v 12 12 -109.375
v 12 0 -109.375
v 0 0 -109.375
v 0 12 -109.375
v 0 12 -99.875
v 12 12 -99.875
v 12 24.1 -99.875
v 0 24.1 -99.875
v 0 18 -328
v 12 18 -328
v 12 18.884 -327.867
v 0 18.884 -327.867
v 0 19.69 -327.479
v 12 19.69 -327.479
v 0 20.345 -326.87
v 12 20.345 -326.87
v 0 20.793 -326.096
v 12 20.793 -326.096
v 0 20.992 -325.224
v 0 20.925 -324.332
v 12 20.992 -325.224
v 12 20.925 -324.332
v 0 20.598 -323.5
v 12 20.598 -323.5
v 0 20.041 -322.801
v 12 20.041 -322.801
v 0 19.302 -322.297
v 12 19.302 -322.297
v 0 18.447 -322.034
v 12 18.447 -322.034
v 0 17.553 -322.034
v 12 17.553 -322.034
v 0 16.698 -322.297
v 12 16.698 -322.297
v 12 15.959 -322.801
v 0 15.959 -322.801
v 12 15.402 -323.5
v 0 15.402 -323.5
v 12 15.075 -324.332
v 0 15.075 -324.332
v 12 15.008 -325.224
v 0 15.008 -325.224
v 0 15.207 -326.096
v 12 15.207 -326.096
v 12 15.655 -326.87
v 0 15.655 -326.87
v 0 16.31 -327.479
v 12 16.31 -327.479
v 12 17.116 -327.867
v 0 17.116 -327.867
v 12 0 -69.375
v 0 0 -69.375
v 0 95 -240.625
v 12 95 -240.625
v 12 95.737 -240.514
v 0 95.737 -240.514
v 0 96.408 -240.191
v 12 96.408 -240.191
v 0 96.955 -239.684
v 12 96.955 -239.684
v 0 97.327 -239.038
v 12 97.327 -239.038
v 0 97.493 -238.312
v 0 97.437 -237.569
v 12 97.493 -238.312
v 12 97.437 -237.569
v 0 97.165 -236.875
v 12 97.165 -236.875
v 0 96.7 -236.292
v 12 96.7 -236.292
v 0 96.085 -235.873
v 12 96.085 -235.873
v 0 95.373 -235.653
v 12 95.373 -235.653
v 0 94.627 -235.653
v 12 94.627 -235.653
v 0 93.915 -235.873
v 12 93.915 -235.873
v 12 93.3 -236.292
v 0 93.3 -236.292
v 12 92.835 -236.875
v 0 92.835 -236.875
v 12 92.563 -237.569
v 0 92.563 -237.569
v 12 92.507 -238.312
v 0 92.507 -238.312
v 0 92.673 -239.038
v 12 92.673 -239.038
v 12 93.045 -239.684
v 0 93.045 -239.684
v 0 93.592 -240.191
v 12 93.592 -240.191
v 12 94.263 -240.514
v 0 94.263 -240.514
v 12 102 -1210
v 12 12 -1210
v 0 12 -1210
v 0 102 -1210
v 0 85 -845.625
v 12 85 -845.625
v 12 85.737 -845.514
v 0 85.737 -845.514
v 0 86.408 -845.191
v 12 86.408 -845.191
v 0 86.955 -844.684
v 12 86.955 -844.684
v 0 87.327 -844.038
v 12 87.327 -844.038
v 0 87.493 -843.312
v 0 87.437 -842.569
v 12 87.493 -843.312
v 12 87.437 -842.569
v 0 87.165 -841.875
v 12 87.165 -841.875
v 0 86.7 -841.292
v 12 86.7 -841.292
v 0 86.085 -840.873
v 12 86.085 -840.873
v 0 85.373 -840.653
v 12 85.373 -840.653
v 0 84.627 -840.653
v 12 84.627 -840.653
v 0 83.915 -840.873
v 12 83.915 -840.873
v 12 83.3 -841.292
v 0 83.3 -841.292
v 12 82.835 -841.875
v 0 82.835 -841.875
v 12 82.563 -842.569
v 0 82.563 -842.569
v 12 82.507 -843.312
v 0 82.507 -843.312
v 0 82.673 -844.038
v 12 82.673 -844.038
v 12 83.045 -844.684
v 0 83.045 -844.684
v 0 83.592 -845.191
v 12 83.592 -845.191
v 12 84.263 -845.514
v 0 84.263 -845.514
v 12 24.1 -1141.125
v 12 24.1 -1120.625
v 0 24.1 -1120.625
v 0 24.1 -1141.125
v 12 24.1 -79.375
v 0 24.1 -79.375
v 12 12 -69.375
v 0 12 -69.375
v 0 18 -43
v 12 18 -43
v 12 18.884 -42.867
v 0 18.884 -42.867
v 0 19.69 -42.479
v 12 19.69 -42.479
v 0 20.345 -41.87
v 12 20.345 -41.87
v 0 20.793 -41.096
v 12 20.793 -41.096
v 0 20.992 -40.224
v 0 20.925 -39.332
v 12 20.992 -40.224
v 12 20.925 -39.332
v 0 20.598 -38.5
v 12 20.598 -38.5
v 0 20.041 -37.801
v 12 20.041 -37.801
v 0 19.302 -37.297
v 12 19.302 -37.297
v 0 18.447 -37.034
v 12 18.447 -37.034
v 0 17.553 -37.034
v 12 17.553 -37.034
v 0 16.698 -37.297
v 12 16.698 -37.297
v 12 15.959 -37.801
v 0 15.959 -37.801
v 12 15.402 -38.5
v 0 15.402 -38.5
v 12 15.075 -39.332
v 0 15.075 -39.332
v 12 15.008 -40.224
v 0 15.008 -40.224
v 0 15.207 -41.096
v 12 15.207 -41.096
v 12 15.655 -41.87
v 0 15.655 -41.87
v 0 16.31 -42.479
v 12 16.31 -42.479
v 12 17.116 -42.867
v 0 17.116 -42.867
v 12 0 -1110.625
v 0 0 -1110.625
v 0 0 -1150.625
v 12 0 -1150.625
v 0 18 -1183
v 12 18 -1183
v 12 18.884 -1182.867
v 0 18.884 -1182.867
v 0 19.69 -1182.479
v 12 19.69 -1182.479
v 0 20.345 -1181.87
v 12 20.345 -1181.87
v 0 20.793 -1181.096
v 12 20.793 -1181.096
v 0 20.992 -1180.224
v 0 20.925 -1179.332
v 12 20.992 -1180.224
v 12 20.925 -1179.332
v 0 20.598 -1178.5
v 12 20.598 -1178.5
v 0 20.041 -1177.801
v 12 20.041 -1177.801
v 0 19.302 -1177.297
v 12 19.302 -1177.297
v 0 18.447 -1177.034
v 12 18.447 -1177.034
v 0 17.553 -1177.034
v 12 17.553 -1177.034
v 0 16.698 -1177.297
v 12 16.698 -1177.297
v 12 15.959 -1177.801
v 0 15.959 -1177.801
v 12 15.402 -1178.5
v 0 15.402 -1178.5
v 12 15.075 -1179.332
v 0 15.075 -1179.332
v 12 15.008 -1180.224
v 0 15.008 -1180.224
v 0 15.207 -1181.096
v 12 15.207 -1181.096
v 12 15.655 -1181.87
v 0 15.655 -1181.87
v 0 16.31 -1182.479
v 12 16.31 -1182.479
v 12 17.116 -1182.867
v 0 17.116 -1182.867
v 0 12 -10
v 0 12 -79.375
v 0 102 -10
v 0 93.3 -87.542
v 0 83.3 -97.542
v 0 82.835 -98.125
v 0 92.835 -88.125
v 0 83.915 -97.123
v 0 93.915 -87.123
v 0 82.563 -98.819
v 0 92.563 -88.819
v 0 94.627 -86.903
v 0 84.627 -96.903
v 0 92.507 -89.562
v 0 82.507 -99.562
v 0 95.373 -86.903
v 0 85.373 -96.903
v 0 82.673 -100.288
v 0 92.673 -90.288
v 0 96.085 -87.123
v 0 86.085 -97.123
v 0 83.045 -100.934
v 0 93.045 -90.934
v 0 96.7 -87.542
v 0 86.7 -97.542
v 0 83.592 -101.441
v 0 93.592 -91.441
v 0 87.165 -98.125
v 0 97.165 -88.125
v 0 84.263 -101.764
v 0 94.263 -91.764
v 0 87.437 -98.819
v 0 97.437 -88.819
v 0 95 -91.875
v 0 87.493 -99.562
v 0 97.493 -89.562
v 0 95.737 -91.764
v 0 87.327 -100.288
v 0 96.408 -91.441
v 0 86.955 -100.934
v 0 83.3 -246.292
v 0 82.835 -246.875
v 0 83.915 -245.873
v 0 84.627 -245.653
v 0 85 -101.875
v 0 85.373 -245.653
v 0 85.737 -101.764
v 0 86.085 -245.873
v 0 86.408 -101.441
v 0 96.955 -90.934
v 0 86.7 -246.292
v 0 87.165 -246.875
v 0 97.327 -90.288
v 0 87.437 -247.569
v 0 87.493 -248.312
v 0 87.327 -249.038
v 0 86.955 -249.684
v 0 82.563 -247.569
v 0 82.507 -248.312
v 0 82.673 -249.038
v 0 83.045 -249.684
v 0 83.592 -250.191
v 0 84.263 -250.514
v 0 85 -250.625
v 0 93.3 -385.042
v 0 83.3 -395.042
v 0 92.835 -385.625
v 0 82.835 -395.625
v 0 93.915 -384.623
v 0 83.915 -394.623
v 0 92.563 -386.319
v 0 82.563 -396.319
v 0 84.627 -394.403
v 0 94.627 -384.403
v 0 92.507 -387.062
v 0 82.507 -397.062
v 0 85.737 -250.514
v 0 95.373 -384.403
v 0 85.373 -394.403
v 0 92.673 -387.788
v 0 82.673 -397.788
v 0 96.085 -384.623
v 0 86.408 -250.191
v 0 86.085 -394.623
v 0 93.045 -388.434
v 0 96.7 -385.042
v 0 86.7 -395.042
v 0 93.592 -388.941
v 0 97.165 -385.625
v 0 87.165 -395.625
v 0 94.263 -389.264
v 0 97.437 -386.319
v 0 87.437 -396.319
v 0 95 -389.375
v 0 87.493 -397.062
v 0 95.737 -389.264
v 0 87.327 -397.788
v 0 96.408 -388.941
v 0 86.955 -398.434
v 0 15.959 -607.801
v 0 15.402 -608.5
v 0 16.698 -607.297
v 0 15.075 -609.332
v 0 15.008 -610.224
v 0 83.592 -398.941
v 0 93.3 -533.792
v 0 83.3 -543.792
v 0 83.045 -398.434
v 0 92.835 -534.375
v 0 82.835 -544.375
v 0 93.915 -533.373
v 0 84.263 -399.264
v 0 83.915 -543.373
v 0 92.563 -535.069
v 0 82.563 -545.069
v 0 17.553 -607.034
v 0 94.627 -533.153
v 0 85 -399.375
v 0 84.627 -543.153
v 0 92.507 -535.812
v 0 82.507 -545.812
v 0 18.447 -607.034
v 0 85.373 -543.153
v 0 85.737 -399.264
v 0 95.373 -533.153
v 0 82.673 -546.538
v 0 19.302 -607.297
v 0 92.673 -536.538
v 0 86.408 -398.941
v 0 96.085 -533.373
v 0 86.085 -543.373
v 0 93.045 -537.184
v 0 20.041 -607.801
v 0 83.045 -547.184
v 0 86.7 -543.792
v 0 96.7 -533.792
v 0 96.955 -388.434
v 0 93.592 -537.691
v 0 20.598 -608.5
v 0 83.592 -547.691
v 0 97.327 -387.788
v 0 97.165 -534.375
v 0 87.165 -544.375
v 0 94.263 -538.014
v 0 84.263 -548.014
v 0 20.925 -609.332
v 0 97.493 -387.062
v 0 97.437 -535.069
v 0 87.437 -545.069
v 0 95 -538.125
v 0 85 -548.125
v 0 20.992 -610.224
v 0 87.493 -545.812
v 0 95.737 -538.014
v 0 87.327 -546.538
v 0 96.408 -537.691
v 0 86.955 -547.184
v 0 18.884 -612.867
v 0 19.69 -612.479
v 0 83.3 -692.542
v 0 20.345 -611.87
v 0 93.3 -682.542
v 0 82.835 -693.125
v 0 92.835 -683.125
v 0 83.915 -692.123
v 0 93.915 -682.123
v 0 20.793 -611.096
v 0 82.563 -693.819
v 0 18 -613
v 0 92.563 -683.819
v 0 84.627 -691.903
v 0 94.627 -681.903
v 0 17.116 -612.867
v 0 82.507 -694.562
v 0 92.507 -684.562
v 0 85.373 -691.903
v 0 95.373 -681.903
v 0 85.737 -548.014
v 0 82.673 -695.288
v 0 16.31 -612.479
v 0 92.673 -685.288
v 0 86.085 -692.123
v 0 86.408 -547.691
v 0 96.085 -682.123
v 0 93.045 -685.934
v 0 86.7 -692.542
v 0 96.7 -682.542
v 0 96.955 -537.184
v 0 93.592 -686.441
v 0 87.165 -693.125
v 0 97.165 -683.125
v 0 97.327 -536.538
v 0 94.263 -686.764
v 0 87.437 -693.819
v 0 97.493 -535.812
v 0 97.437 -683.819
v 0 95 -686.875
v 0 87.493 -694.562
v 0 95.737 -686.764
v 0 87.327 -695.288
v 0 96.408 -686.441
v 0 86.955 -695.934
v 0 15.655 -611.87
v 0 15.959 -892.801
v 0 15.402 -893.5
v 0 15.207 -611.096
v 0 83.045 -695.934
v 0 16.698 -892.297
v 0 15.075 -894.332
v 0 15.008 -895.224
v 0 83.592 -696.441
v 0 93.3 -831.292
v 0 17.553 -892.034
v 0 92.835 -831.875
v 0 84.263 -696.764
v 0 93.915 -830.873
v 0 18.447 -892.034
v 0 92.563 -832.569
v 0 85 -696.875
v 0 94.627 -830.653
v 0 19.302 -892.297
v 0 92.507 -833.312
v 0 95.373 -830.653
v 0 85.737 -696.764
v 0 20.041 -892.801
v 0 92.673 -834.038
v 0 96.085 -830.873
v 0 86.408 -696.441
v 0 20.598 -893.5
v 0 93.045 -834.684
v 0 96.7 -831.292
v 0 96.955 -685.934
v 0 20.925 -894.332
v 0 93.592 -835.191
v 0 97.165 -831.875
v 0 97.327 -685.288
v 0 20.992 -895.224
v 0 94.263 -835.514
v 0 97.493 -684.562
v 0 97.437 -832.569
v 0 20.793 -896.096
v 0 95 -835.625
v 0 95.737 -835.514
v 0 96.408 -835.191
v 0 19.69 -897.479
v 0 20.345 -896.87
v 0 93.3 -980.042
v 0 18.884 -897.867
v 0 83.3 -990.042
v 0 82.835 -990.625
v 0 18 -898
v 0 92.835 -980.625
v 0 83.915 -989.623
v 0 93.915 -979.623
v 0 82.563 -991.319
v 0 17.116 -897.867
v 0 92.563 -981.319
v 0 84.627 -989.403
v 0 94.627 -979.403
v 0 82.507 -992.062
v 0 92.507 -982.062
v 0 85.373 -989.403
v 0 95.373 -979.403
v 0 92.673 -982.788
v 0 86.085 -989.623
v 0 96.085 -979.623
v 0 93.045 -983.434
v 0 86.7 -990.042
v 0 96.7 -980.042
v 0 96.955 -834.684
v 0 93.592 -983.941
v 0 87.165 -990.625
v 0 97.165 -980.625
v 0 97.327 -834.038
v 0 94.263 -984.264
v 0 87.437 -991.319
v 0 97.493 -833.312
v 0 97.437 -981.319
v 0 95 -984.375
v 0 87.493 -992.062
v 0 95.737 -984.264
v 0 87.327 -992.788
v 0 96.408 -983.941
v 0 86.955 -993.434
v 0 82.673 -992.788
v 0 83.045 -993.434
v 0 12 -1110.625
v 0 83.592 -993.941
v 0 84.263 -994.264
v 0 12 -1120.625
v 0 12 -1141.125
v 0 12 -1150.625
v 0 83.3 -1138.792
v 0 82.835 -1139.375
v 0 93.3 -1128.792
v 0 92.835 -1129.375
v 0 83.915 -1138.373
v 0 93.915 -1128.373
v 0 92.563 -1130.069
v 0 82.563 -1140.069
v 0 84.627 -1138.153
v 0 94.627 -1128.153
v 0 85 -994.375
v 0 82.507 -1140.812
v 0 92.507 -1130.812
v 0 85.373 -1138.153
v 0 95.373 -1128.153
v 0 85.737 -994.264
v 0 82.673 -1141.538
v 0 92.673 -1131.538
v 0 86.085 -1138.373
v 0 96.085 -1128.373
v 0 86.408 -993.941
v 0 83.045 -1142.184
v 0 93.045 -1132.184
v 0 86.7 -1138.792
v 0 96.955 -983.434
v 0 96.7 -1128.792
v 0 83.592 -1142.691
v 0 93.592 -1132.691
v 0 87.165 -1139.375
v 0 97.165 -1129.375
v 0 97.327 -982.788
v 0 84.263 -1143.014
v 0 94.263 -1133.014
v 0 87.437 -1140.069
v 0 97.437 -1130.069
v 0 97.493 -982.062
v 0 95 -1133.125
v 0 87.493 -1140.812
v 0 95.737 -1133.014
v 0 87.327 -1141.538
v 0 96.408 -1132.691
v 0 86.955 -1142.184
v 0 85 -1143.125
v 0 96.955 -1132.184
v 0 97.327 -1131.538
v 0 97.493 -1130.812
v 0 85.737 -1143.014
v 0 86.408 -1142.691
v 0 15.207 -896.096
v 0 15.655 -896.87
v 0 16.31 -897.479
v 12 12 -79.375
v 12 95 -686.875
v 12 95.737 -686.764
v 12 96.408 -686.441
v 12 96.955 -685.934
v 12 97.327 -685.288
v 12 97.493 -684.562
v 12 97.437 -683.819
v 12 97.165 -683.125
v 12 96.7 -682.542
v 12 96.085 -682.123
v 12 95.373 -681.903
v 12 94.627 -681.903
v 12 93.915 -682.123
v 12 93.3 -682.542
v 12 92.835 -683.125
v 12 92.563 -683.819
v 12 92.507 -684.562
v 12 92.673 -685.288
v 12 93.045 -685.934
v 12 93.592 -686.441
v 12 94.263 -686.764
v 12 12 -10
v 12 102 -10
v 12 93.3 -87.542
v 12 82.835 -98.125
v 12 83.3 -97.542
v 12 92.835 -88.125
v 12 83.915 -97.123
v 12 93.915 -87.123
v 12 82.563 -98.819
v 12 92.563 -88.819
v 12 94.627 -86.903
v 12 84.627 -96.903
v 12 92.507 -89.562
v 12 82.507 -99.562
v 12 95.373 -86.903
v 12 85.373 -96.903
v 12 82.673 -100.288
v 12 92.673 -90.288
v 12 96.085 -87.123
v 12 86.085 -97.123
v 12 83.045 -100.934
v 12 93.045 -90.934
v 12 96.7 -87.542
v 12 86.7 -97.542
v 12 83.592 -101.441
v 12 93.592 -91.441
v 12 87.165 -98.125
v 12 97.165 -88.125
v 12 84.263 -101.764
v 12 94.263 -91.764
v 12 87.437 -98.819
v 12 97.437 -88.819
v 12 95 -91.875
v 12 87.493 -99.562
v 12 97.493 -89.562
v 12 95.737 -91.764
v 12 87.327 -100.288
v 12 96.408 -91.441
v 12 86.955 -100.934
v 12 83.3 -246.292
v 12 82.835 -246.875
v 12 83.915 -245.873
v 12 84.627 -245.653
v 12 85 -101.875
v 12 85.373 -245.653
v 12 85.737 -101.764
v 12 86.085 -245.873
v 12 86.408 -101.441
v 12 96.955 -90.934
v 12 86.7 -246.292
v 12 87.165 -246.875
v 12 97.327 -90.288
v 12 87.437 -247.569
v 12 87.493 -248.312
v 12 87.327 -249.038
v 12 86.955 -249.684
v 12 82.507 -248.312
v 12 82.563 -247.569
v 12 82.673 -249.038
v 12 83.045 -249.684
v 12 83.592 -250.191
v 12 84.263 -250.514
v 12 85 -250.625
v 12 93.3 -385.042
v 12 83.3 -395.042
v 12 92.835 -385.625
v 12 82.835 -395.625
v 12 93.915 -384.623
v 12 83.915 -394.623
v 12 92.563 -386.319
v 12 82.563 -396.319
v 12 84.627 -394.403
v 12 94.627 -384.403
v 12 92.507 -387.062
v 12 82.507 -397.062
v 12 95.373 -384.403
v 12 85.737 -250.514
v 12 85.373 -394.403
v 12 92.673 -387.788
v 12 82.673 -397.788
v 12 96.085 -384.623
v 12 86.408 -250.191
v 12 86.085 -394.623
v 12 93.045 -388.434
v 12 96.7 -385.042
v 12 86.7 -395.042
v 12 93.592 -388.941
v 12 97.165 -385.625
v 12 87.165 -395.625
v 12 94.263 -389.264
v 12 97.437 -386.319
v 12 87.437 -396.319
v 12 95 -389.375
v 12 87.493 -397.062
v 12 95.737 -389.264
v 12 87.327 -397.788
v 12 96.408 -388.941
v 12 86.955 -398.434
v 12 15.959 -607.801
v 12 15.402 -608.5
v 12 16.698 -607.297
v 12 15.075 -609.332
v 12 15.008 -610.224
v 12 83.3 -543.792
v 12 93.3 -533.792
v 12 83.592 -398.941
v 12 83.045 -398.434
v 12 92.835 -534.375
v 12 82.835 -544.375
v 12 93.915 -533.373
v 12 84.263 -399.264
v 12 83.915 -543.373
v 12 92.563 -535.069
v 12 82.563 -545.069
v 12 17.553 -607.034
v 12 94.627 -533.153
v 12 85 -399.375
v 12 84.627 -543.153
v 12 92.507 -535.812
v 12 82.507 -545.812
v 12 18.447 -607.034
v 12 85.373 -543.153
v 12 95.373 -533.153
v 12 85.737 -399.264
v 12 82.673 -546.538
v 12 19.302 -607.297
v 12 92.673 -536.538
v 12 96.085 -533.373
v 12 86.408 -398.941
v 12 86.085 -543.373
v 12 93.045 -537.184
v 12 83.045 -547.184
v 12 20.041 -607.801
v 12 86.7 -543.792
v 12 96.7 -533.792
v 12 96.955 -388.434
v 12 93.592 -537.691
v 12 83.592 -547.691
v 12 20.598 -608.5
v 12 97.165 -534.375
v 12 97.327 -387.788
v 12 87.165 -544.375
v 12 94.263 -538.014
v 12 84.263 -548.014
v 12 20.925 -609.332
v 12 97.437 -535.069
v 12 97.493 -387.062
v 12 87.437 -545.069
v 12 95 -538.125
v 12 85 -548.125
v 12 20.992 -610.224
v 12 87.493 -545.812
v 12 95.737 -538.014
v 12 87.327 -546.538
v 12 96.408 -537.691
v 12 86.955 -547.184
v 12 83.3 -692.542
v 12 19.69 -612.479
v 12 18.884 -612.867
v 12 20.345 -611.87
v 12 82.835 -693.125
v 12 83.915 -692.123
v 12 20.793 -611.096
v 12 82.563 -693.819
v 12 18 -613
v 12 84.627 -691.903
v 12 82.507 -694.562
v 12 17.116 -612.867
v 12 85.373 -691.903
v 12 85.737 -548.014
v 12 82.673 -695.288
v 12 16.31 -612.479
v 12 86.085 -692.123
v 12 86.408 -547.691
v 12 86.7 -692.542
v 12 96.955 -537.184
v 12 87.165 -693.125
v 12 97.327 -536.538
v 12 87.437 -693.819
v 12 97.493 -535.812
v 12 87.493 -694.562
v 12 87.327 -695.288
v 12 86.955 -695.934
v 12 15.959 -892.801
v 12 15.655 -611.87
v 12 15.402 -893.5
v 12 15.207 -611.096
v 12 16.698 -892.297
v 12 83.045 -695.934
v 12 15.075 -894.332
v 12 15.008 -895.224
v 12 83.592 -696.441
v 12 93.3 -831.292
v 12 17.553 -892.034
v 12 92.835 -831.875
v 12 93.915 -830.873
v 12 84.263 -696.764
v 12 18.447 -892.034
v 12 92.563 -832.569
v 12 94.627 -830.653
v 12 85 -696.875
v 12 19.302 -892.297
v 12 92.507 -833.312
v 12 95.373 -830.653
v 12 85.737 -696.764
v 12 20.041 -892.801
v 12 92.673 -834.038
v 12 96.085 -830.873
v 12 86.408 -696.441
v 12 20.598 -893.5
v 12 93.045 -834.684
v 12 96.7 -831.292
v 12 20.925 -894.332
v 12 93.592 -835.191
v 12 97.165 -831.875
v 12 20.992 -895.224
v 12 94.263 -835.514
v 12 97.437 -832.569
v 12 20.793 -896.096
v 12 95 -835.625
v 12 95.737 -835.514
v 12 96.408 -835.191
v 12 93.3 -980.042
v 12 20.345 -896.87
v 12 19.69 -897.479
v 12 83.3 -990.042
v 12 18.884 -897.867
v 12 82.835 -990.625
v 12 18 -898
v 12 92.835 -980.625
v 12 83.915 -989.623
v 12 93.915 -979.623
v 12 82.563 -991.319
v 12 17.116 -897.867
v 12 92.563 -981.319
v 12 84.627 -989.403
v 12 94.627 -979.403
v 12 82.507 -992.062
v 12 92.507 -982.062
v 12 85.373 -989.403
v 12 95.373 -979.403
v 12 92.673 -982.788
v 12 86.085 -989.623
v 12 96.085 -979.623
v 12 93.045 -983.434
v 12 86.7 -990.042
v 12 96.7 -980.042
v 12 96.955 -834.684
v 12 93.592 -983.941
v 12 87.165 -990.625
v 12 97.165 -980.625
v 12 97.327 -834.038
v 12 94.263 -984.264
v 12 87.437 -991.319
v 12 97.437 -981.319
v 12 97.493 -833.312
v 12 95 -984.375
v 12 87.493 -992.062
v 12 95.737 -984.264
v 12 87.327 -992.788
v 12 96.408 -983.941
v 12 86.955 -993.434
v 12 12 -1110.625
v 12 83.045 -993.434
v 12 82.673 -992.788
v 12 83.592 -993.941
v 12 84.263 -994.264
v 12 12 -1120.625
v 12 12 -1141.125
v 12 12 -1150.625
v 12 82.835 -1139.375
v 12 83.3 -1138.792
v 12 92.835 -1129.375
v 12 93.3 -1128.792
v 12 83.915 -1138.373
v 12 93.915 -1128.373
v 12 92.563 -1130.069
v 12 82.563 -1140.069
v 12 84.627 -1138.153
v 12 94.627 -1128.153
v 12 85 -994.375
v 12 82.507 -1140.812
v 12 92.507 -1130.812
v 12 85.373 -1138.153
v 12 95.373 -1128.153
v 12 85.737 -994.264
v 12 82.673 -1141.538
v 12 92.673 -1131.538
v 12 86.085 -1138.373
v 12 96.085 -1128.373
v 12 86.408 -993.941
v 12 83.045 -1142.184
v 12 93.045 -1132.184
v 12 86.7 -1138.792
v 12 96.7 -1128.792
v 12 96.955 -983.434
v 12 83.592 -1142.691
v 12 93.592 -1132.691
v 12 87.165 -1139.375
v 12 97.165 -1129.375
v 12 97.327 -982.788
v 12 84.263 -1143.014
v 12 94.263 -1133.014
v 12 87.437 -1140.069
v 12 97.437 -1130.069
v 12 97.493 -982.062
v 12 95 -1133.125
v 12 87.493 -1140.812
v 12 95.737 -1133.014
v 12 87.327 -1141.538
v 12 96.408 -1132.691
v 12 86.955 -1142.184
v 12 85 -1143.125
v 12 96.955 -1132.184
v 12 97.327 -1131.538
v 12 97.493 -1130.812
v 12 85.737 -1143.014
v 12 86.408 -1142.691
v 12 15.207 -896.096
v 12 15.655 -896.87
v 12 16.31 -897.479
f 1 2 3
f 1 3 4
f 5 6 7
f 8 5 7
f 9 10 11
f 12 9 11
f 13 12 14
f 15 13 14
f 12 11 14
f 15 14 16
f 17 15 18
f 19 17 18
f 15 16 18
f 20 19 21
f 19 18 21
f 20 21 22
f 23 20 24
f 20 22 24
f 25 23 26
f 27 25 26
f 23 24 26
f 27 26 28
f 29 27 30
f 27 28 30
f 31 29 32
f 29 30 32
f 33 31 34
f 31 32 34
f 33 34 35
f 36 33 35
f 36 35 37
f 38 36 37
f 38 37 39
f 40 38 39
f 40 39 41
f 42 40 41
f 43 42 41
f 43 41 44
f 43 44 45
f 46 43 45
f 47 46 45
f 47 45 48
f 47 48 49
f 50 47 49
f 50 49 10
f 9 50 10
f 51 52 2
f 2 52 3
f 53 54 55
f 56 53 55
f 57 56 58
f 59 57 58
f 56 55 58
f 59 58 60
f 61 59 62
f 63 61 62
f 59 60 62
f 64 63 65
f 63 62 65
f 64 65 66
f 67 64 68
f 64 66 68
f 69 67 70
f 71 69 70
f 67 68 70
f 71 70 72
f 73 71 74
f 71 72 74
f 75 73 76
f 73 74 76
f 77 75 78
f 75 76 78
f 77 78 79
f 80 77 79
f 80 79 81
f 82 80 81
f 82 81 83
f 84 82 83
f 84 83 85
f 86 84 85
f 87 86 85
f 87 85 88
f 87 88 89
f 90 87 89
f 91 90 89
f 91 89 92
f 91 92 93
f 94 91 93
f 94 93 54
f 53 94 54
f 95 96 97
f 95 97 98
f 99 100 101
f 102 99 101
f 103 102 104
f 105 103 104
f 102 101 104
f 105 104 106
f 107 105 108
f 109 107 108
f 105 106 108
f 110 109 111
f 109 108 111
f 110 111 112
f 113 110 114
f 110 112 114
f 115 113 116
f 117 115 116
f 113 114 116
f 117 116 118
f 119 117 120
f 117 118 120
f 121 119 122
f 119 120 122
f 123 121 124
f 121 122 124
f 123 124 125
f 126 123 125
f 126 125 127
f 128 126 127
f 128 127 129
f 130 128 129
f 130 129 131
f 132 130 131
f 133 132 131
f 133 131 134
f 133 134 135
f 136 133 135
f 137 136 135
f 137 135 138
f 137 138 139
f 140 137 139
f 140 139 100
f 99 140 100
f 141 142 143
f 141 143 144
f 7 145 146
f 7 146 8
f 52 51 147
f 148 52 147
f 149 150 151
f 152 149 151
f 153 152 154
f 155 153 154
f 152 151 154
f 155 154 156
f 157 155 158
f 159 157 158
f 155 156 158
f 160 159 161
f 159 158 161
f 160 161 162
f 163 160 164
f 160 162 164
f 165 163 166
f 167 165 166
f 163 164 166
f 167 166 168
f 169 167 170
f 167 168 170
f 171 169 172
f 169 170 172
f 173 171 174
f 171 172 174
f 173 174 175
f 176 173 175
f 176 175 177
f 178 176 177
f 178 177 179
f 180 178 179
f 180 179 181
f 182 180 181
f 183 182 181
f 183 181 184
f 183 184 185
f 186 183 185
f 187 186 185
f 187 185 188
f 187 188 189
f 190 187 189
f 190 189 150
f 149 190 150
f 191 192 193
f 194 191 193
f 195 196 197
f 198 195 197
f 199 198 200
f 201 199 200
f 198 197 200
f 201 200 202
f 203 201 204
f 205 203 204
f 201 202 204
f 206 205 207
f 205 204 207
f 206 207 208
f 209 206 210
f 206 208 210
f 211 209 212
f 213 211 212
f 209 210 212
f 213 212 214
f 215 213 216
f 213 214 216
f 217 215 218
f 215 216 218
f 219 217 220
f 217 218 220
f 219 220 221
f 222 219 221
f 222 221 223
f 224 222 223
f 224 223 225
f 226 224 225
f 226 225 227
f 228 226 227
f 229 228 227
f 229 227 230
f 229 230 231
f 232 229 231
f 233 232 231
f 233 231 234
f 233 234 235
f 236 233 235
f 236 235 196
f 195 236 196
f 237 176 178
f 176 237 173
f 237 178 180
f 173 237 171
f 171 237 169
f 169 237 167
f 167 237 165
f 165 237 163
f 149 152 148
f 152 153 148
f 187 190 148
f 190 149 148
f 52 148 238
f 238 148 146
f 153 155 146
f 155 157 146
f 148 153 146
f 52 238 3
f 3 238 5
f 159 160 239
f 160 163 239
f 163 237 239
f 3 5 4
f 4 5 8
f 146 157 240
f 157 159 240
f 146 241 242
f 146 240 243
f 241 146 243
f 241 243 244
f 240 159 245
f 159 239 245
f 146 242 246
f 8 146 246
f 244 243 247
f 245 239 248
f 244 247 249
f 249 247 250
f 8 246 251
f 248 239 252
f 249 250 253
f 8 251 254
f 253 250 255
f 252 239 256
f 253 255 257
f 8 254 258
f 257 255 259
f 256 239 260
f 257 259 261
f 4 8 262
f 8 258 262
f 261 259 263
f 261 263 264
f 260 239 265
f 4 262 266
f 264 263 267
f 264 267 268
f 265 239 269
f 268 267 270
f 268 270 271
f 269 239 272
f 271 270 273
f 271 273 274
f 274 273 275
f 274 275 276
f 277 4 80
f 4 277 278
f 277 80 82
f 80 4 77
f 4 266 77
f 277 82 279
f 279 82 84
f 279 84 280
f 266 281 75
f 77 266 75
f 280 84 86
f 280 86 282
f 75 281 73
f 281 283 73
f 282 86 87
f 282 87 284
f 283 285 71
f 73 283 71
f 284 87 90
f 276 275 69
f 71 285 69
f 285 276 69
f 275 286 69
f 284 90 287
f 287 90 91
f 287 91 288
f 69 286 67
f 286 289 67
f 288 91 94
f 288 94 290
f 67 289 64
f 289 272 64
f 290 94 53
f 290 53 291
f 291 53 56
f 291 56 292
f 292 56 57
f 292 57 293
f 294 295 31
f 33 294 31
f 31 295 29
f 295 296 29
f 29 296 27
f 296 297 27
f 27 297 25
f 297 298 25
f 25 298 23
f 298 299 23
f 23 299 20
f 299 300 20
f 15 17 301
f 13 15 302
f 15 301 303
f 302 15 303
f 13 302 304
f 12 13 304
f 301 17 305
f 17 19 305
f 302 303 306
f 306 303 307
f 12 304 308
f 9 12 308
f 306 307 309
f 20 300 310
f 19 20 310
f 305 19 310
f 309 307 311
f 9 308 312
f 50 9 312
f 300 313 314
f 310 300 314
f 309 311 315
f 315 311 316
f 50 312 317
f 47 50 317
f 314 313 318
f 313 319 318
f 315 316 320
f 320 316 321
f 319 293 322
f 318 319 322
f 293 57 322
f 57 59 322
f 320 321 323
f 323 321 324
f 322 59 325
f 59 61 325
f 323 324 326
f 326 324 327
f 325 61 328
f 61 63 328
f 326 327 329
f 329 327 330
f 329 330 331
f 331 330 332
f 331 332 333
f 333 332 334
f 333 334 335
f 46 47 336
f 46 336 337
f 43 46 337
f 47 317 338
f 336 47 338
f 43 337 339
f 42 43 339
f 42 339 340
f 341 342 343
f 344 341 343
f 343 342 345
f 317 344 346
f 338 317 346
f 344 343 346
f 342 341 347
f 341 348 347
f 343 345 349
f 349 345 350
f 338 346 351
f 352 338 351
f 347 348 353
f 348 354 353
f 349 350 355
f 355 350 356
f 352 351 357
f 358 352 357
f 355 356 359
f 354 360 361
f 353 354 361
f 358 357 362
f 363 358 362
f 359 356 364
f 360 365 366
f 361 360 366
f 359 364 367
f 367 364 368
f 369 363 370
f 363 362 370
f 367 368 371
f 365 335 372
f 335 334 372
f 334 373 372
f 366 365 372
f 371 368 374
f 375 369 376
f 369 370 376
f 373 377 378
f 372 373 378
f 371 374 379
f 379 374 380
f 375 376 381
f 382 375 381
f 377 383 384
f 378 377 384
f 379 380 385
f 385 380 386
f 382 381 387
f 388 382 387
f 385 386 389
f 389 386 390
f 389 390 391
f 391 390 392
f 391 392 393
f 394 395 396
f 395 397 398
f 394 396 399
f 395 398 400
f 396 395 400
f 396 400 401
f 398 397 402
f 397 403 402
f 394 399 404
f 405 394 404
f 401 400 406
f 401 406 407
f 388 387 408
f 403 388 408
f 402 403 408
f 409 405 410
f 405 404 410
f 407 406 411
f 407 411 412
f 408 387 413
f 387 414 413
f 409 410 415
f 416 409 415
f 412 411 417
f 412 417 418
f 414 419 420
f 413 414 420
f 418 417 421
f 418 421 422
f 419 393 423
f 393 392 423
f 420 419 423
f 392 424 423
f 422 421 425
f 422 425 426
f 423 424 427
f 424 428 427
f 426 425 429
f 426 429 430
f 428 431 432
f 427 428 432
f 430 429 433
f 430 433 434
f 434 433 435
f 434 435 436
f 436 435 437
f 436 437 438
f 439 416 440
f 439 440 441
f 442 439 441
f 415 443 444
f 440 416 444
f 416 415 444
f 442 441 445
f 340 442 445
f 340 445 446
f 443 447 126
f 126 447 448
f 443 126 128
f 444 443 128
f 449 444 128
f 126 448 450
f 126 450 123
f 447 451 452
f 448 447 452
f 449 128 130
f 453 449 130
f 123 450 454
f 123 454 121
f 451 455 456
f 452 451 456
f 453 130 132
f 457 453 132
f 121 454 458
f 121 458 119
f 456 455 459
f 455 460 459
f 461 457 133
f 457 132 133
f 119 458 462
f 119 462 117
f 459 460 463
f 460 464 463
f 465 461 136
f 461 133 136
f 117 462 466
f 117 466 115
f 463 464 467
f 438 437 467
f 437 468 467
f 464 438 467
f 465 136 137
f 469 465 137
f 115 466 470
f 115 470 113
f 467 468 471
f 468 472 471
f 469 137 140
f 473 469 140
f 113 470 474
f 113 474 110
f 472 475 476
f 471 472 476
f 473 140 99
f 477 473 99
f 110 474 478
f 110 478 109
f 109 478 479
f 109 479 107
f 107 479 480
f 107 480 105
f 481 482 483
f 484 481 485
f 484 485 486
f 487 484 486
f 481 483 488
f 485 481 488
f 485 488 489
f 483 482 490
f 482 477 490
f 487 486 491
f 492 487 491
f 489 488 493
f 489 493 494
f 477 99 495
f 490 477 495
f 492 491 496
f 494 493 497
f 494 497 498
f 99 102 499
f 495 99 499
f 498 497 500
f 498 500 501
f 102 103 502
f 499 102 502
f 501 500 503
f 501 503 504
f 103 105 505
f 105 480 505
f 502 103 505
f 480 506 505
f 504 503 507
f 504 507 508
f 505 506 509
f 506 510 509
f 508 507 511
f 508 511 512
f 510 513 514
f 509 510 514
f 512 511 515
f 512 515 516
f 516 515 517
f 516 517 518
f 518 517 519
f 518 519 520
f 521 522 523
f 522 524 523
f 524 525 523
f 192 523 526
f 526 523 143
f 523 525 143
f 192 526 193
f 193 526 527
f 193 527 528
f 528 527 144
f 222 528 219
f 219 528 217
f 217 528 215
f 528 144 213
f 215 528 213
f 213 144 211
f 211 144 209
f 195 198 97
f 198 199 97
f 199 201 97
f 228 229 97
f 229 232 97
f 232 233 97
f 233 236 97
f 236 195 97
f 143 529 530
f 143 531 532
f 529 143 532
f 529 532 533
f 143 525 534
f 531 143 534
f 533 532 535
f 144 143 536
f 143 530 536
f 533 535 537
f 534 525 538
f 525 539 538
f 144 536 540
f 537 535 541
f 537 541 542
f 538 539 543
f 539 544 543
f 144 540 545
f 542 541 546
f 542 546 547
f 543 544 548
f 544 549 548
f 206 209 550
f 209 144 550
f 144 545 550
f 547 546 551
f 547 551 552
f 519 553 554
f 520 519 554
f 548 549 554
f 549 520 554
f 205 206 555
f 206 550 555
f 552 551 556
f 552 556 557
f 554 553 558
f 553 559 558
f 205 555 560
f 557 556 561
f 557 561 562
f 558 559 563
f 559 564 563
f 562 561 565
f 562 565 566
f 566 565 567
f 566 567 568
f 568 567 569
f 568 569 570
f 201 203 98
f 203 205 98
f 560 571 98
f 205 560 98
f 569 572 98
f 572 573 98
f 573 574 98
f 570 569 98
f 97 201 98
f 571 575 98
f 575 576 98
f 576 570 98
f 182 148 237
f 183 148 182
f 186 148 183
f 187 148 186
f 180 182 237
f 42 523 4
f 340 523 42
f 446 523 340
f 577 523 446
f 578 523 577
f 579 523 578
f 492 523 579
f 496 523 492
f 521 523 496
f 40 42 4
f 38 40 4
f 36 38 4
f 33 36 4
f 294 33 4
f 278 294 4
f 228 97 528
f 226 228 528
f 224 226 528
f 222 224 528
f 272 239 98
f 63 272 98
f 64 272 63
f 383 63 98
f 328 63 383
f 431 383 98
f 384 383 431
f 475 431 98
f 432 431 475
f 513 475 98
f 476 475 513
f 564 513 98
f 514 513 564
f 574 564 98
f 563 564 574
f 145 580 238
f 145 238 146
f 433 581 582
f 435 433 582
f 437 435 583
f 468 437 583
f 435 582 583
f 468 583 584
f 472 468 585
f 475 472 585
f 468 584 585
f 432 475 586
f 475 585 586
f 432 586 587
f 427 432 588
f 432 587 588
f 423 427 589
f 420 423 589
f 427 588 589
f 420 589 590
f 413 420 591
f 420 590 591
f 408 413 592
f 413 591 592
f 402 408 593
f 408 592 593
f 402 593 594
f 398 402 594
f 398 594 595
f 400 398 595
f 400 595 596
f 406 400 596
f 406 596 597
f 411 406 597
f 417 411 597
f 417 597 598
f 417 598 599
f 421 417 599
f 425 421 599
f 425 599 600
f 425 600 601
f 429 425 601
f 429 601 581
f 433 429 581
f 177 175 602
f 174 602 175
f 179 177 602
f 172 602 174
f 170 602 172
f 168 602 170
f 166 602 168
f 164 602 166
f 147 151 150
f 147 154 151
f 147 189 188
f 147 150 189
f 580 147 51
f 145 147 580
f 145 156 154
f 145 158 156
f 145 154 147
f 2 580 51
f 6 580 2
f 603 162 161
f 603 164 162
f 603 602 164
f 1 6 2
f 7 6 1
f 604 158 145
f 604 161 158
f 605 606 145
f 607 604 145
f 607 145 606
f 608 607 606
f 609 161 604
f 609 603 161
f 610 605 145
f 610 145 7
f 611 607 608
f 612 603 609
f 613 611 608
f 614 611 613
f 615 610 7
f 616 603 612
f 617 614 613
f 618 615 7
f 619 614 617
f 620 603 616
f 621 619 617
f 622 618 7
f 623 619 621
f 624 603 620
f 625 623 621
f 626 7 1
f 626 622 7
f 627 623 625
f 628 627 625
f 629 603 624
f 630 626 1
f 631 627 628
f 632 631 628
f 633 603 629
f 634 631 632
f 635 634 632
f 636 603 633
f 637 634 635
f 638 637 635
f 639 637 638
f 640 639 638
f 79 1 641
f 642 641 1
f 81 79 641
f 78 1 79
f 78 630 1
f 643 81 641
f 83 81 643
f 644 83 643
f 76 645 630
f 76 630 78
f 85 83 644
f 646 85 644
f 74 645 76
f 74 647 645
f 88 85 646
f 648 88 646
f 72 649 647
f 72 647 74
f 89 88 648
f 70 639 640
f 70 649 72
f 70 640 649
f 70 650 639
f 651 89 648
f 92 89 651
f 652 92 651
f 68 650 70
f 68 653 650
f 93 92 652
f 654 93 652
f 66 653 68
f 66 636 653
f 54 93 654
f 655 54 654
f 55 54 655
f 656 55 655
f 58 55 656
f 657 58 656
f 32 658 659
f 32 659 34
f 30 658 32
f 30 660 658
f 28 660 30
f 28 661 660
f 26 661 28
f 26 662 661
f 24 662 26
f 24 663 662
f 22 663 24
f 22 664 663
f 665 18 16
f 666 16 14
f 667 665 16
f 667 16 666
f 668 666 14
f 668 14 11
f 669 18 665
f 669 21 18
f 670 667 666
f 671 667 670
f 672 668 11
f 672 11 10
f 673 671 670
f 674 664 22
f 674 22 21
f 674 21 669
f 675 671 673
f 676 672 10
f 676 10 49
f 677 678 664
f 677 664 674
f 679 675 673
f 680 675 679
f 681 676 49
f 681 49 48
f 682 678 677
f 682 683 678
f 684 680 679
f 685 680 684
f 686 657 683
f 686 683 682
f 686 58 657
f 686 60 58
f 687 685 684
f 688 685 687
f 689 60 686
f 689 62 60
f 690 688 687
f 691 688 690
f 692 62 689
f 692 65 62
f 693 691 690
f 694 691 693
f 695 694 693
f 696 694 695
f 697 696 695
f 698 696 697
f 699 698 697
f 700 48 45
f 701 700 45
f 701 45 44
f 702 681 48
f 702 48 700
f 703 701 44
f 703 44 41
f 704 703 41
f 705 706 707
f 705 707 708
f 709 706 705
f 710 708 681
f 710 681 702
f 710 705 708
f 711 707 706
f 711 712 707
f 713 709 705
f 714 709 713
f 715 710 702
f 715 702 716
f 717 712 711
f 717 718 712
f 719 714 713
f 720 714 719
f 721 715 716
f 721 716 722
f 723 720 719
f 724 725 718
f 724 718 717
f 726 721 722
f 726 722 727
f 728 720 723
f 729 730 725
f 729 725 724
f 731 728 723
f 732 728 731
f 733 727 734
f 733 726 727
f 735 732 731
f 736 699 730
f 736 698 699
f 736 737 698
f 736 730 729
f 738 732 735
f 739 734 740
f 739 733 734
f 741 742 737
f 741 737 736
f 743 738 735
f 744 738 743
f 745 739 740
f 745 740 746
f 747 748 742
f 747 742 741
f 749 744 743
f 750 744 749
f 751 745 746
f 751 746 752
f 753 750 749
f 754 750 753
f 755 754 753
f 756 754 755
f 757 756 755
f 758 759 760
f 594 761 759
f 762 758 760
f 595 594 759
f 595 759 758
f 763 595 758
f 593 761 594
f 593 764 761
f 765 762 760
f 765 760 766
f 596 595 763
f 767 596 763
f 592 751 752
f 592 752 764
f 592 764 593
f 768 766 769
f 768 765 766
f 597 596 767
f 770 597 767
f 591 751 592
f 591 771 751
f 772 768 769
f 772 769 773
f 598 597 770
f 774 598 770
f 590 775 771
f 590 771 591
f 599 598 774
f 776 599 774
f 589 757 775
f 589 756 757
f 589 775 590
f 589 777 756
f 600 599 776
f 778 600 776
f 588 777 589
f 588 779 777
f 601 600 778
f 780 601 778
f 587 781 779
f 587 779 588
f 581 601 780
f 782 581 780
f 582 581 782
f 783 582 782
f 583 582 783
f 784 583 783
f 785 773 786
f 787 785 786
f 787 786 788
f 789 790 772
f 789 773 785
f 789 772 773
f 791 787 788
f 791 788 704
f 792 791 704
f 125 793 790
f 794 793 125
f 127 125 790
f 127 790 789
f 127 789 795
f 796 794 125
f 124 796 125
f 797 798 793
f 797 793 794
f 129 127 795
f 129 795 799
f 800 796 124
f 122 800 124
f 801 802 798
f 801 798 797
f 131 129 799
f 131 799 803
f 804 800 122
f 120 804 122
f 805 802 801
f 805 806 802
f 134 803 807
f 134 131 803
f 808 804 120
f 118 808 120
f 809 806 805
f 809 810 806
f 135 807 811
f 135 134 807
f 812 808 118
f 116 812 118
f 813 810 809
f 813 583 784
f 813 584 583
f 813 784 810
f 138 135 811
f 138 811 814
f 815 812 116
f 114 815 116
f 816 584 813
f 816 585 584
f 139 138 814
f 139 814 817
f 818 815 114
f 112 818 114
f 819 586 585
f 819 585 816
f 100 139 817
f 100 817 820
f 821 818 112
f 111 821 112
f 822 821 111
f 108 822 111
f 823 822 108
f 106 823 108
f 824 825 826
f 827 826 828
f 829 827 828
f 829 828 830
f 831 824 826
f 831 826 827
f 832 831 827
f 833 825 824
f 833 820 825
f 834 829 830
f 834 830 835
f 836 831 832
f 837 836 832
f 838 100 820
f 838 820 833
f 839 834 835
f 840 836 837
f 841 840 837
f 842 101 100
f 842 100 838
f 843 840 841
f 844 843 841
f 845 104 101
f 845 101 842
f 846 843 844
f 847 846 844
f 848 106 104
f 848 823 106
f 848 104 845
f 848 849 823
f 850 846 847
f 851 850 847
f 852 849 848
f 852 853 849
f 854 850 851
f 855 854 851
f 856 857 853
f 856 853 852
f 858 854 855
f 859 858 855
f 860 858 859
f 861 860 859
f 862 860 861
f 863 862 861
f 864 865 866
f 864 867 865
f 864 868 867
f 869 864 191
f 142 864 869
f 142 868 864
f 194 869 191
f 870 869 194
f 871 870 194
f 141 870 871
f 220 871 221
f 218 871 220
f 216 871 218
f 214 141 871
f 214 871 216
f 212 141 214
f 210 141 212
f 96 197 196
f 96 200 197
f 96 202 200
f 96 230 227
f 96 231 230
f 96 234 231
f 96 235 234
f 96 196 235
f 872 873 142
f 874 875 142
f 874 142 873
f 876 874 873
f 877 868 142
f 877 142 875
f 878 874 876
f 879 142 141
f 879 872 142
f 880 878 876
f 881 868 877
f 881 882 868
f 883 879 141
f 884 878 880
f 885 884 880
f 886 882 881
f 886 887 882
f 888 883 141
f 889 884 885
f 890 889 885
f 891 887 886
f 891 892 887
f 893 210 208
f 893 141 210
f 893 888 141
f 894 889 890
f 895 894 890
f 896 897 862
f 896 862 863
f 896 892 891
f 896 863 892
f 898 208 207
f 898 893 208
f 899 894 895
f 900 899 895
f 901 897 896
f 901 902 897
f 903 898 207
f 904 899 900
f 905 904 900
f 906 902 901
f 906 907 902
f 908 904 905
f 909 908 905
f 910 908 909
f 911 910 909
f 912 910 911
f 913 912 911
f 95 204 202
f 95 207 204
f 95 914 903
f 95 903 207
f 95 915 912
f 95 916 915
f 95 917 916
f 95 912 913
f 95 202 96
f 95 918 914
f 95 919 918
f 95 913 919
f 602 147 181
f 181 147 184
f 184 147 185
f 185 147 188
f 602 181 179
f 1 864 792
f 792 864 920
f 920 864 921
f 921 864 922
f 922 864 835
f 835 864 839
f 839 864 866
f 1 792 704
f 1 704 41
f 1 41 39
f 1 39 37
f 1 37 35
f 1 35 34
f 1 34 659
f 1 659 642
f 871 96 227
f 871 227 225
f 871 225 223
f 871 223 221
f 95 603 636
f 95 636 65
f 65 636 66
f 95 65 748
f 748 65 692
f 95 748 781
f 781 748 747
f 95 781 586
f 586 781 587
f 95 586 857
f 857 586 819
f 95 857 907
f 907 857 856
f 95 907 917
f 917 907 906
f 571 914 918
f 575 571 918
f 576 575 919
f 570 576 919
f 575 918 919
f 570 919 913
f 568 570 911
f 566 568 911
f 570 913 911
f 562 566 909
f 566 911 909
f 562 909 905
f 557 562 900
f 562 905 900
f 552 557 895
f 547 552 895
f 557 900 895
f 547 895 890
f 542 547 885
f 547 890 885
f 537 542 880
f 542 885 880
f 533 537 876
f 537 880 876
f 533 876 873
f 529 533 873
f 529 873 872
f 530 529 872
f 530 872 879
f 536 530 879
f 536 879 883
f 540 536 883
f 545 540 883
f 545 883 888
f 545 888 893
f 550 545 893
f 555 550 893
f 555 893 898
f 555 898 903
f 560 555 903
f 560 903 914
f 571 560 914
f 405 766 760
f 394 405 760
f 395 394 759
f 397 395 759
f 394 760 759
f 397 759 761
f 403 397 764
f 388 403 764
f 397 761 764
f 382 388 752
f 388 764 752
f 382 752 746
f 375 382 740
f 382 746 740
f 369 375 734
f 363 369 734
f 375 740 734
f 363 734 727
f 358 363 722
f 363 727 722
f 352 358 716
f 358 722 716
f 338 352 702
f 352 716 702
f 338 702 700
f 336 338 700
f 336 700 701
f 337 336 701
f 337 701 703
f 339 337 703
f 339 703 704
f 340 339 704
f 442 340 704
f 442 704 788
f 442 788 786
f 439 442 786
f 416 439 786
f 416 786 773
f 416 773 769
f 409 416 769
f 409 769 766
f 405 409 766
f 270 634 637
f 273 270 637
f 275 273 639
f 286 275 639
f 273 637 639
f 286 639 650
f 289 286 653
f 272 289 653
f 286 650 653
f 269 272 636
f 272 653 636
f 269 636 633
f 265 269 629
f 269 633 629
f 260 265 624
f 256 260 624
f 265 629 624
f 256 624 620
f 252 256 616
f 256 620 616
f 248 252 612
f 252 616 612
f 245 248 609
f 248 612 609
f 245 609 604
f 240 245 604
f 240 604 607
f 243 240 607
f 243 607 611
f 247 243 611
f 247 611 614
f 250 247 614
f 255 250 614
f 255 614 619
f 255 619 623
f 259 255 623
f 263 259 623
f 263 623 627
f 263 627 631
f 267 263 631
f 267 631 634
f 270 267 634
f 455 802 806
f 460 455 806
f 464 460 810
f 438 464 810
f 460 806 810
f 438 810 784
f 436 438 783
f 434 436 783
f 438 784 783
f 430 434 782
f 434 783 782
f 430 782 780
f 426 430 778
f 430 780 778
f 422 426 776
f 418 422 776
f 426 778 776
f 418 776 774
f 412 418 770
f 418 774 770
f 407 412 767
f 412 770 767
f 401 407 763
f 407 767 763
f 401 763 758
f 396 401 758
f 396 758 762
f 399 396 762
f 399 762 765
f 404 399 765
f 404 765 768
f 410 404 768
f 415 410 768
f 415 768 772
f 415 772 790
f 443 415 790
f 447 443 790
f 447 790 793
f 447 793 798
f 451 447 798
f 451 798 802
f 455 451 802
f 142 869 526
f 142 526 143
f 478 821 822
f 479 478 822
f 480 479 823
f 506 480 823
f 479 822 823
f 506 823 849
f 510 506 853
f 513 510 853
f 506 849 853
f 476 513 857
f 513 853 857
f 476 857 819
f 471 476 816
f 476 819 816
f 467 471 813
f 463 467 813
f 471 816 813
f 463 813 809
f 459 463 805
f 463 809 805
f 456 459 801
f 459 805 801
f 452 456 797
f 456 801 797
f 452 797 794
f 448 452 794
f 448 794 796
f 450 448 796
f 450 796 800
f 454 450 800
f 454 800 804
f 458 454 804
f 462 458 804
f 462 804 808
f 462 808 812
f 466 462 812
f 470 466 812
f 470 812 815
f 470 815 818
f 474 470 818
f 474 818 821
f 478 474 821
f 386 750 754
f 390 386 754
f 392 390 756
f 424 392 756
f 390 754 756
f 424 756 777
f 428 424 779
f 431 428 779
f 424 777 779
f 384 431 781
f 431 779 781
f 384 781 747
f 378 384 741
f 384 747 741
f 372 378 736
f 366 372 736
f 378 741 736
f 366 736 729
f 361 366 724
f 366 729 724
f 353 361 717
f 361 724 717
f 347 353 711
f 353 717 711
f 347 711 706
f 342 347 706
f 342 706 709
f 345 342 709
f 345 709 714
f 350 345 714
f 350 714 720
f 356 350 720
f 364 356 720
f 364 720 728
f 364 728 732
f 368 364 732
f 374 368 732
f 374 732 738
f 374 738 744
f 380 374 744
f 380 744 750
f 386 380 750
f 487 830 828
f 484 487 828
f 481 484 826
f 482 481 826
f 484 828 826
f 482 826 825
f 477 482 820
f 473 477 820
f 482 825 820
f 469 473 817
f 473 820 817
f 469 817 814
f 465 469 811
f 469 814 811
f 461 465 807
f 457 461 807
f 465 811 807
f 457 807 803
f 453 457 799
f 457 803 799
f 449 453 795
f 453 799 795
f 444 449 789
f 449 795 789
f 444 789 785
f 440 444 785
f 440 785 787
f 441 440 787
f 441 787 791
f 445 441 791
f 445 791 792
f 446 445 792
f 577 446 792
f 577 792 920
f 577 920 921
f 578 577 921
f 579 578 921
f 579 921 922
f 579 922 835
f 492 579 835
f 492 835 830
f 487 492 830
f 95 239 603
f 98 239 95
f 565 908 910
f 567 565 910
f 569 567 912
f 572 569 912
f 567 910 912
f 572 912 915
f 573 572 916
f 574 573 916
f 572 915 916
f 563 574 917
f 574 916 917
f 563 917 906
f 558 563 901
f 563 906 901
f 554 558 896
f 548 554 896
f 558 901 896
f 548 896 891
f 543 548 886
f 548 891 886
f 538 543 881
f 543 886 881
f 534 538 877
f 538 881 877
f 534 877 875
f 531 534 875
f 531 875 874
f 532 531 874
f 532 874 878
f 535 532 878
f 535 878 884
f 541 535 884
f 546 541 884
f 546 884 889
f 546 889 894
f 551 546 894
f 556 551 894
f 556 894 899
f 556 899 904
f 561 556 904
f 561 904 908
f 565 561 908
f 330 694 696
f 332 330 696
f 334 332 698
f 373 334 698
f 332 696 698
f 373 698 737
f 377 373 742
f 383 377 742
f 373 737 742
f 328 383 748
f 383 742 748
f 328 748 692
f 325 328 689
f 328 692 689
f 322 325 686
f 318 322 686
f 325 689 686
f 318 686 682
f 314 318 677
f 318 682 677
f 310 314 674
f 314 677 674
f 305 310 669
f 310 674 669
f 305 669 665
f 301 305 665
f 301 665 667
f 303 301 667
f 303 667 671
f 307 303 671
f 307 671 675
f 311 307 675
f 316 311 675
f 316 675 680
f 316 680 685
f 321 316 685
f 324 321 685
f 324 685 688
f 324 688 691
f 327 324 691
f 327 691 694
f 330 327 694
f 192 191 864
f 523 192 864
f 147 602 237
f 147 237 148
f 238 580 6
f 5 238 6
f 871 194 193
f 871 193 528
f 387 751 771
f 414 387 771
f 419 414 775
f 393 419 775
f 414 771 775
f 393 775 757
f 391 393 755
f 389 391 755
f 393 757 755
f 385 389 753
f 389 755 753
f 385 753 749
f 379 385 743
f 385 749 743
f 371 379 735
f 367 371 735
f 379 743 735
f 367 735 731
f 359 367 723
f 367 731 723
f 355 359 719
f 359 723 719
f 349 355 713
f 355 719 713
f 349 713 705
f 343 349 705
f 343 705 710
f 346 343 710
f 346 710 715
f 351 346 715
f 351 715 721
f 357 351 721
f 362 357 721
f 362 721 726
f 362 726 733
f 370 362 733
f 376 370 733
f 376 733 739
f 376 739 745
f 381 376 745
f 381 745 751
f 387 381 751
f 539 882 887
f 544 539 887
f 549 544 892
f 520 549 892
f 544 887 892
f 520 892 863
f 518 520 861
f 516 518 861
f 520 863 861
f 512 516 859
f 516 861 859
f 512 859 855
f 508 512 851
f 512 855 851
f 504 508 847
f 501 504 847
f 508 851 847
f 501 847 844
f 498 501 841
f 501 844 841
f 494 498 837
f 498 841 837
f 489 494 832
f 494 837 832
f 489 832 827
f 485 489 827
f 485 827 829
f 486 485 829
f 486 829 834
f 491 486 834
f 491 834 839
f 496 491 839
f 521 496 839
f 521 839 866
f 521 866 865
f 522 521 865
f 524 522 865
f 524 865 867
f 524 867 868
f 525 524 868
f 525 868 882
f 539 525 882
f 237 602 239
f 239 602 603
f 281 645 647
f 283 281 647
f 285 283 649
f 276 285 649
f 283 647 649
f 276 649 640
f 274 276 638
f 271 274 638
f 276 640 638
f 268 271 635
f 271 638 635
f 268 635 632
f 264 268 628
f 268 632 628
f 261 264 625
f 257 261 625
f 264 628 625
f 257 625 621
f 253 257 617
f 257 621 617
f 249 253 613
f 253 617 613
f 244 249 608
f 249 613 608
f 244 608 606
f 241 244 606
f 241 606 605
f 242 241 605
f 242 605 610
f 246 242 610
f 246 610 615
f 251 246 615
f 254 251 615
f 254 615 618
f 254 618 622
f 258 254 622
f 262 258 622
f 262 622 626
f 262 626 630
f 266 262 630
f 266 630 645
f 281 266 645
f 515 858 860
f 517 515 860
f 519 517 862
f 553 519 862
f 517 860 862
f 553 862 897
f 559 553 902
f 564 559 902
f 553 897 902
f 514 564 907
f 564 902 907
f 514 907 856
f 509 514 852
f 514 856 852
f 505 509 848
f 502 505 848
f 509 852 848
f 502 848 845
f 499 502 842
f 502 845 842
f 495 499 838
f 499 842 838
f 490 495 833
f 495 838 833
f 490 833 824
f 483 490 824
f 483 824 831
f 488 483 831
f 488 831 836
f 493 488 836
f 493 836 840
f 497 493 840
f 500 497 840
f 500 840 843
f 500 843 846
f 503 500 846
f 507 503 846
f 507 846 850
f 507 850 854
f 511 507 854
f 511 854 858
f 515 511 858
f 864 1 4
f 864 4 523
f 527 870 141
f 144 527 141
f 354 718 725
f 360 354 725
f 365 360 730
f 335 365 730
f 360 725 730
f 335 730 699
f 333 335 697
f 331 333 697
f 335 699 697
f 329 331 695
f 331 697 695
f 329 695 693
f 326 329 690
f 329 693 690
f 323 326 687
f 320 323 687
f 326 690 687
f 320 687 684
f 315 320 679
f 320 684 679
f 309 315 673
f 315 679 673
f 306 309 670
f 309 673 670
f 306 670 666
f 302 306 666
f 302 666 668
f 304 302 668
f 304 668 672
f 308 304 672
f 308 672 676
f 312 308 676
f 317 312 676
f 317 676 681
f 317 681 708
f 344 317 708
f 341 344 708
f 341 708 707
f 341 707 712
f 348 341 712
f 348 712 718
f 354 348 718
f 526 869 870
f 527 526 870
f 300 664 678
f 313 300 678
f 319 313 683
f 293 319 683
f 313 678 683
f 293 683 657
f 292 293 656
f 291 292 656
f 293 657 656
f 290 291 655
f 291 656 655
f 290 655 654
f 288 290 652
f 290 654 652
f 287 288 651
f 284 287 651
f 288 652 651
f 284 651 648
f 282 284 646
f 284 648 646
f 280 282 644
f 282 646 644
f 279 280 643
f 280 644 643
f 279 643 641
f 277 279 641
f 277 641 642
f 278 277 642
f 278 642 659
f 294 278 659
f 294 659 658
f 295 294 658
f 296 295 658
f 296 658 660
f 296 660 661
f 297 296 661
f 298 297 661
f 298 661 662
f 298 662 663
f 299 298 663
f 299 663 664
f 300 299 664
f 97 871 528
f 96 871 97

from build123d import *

# Parameters (mm, degrees)
SKETCH1_W           = 1220
SKETCH1_H           = 102
BOSS_EXTRUDE1_DEPTH = 12
SKETCH4_W           = 84.308730764
SKETCH4_H           = 36.280116476
SKETCH4_W_2         = 1001.25
SKETCH4_H_2         = 42.963295827
SKETCH4_W_3         = 112.735688249
CUT_EXTRUDE1_DEPTH  = 20
SKETCH5_W           = 107.106738726
SKETCH5_H           = 164.152719134
SKETCH5_W_2         = 109.43514609
SKETCH5_H_2         = 176.958959634
CUT_EXTRUDE2_DEPTH  = 20
SKETCH6_R           = 2.5
CUT_EXTRUDE3_DEPTH  = 20
SKETCH7_R           = 2.5
CUT_EXTRUDE4_DEPTH  = 22
SKETCH8_W           = 20.5
SKETCH8_H           = 12.1
CUT_EXTRUDE5_DEPTH  = 20
SKETCH9_R           = 3
CUT_EXTRUDE6_DEPTH  = 20


with BuildPart() as part:
    # Sketch1 → Boss-Extrude1 (new body)
    with BuildSketch(Plane(origin=(0, 0, 0), x_dir=(0, 0, -1), z_dir=(1, 0, 0))):
        with Locations((610, 51)):
            Rectangle(SKETCH1_W, SKETCH1_H)
    extrude(amount=BOSS_EXTRUDE1_DEPTH)

    # Sketch4 → Cut-Extrude1 (cut)
    with BuildSketch(Plane(origin=(12, 0, 0), x_dir=(0, 0, -1), z_dir=(1, 0, 0))):
        with Locations((27.220634618, -6.140058238)):
            Rectangle(SKETCH4_W, SKETCH4_H)
        with Locations((610, -9.481647914)):
            Rectangle(SKETCH4_W_2, SKETCH4_H_2)
        with Locations((1206.992844125, -9.481647914)):
            Rectangle(SKETCH4_W_3, SKETCH4_H_2)
    extrude(amount=-CUT_EXTRUDE1_DEPTH, mode=Mode.SUBTRACT)

    # Sketch5 → Cut-Extrude2 (cut)
    with BuildSketch(Plane(origin=(12, 0, 0), x_dir=(0, 0, -1), z_dir=(1, 0, 0))):
        with Locations((1263.553369363, 24.432676068)):
            Rectangle(SKETCH5_W, SKETCH5_H)
        with Locations((-44.717573045, 30.835796318)):
            Rectangle(SKETCH5_W_2, SKETCH5_H_2)
    extrude(amount=-CUT_EXTRUDE2_DEPTH, mode=Mode.SUBTRACT)

    # Sketch6 → Cut-Extrude3 (cut)
    with BuildSketch(Plane(origin=(12, 0, 0), x_dir=(0, 0, -1), z_dir=(1, 0, 0))):
        with Locations((89.375, 95)):
            Circle(SKETCH6_R)
        with Locations((238.125, 95)):
            Circle(SKETCH6_R)
        with Locations((386.875, 95)):
            Circle(SKETCH6_R)
        with Locations((535.625, 95)):
            Circle(SKETCH6_R)
        with Locations((684.375, 95)):
            Circle(SKETCH6_R)
        with Locations((833.125, 95)):
            Circle(SKETCH6_R)
        with Locations((981.875, 95)):
            Circle(SKETCH6_R)
        with Locations((1130.625, 95)):
            Circle(SKETCH6_R)
    extrude(amount=-CUT_EXTRUDE3_DEPTH, mode=Mode.SUBTRACT)

    # Sketch7 → Cut-Extrude4 (cut)
    with BuildSketch(Plane(origin=(12, 0, 0), x_dir=(0, 0, -1), z_dir=(1, 0, 0))):
        with Locations((99.375, 85)):
            Circle(SKETCH7_R)
        with Locations((248.125, 85)):
            Circle(SKETCH7_R)
        with Locations((396.875, 85)):
            Circle(SKETCH7_R)
        with Locations((545.625, 85)):
            Circle(SKETCH7_R)
        with Locations((694.375, 85)):
            Circle(SKETCH7_R)
        with Locations((843.125, 85)):
            Circle(SKETCH7_R)
        with Locations((991.875, 85)):
            Circle(SKETCH7_R)
        with Locations((1140.625, 85)):
            Circle(SKETCH7_R)
    extrude(amount=-CUT_EXTRUDE4_DEPTH, mode=Mode.SUBTRACT)

    # Sketch8 → Cut-Extrude5 (cut)
    with BuildSketch(Plane(origin=(12, 0, 0), x_dir=(0, 0, -1), z_dir=(1, 0, 0))):
        with Locations((89.625, 18.05)):
            Rectangle(SKETCH8_W, SKETCH8_H)
        with Locations((1130.875, 18.05)):
            Rectangle(SKETCH8_W, SKETCH8_H)
    extrude(amount=-CUT_EXTRUDE5_DEPTH, mode=Mode.SUBTRACT)

    # Sketch9 → Cut-Extrude6 (cut)
    with BuildSketch(Plane(origin=(12, 0, 0), x_dir=(0, 0, -1), z_dir=(1, 0, 0))):
        with Locations((40, 18)):
            Circle(SKETCH9_R)
        with Locations((325, 18)):
            Circle(SKETCH9_R)
        with Locations((610, 18)):
            Circle(SKETCH9_R)
        with Locations((895, 18)):
            Circle(SKETCH9_R)
        with Locations((1180, 18)):
            Circle(SKETCH9_R)
    extrude(amount=-CUT_EXTRUDE6_DEPTH, mode=Mode.SUBTRACT)


solid = part.part
